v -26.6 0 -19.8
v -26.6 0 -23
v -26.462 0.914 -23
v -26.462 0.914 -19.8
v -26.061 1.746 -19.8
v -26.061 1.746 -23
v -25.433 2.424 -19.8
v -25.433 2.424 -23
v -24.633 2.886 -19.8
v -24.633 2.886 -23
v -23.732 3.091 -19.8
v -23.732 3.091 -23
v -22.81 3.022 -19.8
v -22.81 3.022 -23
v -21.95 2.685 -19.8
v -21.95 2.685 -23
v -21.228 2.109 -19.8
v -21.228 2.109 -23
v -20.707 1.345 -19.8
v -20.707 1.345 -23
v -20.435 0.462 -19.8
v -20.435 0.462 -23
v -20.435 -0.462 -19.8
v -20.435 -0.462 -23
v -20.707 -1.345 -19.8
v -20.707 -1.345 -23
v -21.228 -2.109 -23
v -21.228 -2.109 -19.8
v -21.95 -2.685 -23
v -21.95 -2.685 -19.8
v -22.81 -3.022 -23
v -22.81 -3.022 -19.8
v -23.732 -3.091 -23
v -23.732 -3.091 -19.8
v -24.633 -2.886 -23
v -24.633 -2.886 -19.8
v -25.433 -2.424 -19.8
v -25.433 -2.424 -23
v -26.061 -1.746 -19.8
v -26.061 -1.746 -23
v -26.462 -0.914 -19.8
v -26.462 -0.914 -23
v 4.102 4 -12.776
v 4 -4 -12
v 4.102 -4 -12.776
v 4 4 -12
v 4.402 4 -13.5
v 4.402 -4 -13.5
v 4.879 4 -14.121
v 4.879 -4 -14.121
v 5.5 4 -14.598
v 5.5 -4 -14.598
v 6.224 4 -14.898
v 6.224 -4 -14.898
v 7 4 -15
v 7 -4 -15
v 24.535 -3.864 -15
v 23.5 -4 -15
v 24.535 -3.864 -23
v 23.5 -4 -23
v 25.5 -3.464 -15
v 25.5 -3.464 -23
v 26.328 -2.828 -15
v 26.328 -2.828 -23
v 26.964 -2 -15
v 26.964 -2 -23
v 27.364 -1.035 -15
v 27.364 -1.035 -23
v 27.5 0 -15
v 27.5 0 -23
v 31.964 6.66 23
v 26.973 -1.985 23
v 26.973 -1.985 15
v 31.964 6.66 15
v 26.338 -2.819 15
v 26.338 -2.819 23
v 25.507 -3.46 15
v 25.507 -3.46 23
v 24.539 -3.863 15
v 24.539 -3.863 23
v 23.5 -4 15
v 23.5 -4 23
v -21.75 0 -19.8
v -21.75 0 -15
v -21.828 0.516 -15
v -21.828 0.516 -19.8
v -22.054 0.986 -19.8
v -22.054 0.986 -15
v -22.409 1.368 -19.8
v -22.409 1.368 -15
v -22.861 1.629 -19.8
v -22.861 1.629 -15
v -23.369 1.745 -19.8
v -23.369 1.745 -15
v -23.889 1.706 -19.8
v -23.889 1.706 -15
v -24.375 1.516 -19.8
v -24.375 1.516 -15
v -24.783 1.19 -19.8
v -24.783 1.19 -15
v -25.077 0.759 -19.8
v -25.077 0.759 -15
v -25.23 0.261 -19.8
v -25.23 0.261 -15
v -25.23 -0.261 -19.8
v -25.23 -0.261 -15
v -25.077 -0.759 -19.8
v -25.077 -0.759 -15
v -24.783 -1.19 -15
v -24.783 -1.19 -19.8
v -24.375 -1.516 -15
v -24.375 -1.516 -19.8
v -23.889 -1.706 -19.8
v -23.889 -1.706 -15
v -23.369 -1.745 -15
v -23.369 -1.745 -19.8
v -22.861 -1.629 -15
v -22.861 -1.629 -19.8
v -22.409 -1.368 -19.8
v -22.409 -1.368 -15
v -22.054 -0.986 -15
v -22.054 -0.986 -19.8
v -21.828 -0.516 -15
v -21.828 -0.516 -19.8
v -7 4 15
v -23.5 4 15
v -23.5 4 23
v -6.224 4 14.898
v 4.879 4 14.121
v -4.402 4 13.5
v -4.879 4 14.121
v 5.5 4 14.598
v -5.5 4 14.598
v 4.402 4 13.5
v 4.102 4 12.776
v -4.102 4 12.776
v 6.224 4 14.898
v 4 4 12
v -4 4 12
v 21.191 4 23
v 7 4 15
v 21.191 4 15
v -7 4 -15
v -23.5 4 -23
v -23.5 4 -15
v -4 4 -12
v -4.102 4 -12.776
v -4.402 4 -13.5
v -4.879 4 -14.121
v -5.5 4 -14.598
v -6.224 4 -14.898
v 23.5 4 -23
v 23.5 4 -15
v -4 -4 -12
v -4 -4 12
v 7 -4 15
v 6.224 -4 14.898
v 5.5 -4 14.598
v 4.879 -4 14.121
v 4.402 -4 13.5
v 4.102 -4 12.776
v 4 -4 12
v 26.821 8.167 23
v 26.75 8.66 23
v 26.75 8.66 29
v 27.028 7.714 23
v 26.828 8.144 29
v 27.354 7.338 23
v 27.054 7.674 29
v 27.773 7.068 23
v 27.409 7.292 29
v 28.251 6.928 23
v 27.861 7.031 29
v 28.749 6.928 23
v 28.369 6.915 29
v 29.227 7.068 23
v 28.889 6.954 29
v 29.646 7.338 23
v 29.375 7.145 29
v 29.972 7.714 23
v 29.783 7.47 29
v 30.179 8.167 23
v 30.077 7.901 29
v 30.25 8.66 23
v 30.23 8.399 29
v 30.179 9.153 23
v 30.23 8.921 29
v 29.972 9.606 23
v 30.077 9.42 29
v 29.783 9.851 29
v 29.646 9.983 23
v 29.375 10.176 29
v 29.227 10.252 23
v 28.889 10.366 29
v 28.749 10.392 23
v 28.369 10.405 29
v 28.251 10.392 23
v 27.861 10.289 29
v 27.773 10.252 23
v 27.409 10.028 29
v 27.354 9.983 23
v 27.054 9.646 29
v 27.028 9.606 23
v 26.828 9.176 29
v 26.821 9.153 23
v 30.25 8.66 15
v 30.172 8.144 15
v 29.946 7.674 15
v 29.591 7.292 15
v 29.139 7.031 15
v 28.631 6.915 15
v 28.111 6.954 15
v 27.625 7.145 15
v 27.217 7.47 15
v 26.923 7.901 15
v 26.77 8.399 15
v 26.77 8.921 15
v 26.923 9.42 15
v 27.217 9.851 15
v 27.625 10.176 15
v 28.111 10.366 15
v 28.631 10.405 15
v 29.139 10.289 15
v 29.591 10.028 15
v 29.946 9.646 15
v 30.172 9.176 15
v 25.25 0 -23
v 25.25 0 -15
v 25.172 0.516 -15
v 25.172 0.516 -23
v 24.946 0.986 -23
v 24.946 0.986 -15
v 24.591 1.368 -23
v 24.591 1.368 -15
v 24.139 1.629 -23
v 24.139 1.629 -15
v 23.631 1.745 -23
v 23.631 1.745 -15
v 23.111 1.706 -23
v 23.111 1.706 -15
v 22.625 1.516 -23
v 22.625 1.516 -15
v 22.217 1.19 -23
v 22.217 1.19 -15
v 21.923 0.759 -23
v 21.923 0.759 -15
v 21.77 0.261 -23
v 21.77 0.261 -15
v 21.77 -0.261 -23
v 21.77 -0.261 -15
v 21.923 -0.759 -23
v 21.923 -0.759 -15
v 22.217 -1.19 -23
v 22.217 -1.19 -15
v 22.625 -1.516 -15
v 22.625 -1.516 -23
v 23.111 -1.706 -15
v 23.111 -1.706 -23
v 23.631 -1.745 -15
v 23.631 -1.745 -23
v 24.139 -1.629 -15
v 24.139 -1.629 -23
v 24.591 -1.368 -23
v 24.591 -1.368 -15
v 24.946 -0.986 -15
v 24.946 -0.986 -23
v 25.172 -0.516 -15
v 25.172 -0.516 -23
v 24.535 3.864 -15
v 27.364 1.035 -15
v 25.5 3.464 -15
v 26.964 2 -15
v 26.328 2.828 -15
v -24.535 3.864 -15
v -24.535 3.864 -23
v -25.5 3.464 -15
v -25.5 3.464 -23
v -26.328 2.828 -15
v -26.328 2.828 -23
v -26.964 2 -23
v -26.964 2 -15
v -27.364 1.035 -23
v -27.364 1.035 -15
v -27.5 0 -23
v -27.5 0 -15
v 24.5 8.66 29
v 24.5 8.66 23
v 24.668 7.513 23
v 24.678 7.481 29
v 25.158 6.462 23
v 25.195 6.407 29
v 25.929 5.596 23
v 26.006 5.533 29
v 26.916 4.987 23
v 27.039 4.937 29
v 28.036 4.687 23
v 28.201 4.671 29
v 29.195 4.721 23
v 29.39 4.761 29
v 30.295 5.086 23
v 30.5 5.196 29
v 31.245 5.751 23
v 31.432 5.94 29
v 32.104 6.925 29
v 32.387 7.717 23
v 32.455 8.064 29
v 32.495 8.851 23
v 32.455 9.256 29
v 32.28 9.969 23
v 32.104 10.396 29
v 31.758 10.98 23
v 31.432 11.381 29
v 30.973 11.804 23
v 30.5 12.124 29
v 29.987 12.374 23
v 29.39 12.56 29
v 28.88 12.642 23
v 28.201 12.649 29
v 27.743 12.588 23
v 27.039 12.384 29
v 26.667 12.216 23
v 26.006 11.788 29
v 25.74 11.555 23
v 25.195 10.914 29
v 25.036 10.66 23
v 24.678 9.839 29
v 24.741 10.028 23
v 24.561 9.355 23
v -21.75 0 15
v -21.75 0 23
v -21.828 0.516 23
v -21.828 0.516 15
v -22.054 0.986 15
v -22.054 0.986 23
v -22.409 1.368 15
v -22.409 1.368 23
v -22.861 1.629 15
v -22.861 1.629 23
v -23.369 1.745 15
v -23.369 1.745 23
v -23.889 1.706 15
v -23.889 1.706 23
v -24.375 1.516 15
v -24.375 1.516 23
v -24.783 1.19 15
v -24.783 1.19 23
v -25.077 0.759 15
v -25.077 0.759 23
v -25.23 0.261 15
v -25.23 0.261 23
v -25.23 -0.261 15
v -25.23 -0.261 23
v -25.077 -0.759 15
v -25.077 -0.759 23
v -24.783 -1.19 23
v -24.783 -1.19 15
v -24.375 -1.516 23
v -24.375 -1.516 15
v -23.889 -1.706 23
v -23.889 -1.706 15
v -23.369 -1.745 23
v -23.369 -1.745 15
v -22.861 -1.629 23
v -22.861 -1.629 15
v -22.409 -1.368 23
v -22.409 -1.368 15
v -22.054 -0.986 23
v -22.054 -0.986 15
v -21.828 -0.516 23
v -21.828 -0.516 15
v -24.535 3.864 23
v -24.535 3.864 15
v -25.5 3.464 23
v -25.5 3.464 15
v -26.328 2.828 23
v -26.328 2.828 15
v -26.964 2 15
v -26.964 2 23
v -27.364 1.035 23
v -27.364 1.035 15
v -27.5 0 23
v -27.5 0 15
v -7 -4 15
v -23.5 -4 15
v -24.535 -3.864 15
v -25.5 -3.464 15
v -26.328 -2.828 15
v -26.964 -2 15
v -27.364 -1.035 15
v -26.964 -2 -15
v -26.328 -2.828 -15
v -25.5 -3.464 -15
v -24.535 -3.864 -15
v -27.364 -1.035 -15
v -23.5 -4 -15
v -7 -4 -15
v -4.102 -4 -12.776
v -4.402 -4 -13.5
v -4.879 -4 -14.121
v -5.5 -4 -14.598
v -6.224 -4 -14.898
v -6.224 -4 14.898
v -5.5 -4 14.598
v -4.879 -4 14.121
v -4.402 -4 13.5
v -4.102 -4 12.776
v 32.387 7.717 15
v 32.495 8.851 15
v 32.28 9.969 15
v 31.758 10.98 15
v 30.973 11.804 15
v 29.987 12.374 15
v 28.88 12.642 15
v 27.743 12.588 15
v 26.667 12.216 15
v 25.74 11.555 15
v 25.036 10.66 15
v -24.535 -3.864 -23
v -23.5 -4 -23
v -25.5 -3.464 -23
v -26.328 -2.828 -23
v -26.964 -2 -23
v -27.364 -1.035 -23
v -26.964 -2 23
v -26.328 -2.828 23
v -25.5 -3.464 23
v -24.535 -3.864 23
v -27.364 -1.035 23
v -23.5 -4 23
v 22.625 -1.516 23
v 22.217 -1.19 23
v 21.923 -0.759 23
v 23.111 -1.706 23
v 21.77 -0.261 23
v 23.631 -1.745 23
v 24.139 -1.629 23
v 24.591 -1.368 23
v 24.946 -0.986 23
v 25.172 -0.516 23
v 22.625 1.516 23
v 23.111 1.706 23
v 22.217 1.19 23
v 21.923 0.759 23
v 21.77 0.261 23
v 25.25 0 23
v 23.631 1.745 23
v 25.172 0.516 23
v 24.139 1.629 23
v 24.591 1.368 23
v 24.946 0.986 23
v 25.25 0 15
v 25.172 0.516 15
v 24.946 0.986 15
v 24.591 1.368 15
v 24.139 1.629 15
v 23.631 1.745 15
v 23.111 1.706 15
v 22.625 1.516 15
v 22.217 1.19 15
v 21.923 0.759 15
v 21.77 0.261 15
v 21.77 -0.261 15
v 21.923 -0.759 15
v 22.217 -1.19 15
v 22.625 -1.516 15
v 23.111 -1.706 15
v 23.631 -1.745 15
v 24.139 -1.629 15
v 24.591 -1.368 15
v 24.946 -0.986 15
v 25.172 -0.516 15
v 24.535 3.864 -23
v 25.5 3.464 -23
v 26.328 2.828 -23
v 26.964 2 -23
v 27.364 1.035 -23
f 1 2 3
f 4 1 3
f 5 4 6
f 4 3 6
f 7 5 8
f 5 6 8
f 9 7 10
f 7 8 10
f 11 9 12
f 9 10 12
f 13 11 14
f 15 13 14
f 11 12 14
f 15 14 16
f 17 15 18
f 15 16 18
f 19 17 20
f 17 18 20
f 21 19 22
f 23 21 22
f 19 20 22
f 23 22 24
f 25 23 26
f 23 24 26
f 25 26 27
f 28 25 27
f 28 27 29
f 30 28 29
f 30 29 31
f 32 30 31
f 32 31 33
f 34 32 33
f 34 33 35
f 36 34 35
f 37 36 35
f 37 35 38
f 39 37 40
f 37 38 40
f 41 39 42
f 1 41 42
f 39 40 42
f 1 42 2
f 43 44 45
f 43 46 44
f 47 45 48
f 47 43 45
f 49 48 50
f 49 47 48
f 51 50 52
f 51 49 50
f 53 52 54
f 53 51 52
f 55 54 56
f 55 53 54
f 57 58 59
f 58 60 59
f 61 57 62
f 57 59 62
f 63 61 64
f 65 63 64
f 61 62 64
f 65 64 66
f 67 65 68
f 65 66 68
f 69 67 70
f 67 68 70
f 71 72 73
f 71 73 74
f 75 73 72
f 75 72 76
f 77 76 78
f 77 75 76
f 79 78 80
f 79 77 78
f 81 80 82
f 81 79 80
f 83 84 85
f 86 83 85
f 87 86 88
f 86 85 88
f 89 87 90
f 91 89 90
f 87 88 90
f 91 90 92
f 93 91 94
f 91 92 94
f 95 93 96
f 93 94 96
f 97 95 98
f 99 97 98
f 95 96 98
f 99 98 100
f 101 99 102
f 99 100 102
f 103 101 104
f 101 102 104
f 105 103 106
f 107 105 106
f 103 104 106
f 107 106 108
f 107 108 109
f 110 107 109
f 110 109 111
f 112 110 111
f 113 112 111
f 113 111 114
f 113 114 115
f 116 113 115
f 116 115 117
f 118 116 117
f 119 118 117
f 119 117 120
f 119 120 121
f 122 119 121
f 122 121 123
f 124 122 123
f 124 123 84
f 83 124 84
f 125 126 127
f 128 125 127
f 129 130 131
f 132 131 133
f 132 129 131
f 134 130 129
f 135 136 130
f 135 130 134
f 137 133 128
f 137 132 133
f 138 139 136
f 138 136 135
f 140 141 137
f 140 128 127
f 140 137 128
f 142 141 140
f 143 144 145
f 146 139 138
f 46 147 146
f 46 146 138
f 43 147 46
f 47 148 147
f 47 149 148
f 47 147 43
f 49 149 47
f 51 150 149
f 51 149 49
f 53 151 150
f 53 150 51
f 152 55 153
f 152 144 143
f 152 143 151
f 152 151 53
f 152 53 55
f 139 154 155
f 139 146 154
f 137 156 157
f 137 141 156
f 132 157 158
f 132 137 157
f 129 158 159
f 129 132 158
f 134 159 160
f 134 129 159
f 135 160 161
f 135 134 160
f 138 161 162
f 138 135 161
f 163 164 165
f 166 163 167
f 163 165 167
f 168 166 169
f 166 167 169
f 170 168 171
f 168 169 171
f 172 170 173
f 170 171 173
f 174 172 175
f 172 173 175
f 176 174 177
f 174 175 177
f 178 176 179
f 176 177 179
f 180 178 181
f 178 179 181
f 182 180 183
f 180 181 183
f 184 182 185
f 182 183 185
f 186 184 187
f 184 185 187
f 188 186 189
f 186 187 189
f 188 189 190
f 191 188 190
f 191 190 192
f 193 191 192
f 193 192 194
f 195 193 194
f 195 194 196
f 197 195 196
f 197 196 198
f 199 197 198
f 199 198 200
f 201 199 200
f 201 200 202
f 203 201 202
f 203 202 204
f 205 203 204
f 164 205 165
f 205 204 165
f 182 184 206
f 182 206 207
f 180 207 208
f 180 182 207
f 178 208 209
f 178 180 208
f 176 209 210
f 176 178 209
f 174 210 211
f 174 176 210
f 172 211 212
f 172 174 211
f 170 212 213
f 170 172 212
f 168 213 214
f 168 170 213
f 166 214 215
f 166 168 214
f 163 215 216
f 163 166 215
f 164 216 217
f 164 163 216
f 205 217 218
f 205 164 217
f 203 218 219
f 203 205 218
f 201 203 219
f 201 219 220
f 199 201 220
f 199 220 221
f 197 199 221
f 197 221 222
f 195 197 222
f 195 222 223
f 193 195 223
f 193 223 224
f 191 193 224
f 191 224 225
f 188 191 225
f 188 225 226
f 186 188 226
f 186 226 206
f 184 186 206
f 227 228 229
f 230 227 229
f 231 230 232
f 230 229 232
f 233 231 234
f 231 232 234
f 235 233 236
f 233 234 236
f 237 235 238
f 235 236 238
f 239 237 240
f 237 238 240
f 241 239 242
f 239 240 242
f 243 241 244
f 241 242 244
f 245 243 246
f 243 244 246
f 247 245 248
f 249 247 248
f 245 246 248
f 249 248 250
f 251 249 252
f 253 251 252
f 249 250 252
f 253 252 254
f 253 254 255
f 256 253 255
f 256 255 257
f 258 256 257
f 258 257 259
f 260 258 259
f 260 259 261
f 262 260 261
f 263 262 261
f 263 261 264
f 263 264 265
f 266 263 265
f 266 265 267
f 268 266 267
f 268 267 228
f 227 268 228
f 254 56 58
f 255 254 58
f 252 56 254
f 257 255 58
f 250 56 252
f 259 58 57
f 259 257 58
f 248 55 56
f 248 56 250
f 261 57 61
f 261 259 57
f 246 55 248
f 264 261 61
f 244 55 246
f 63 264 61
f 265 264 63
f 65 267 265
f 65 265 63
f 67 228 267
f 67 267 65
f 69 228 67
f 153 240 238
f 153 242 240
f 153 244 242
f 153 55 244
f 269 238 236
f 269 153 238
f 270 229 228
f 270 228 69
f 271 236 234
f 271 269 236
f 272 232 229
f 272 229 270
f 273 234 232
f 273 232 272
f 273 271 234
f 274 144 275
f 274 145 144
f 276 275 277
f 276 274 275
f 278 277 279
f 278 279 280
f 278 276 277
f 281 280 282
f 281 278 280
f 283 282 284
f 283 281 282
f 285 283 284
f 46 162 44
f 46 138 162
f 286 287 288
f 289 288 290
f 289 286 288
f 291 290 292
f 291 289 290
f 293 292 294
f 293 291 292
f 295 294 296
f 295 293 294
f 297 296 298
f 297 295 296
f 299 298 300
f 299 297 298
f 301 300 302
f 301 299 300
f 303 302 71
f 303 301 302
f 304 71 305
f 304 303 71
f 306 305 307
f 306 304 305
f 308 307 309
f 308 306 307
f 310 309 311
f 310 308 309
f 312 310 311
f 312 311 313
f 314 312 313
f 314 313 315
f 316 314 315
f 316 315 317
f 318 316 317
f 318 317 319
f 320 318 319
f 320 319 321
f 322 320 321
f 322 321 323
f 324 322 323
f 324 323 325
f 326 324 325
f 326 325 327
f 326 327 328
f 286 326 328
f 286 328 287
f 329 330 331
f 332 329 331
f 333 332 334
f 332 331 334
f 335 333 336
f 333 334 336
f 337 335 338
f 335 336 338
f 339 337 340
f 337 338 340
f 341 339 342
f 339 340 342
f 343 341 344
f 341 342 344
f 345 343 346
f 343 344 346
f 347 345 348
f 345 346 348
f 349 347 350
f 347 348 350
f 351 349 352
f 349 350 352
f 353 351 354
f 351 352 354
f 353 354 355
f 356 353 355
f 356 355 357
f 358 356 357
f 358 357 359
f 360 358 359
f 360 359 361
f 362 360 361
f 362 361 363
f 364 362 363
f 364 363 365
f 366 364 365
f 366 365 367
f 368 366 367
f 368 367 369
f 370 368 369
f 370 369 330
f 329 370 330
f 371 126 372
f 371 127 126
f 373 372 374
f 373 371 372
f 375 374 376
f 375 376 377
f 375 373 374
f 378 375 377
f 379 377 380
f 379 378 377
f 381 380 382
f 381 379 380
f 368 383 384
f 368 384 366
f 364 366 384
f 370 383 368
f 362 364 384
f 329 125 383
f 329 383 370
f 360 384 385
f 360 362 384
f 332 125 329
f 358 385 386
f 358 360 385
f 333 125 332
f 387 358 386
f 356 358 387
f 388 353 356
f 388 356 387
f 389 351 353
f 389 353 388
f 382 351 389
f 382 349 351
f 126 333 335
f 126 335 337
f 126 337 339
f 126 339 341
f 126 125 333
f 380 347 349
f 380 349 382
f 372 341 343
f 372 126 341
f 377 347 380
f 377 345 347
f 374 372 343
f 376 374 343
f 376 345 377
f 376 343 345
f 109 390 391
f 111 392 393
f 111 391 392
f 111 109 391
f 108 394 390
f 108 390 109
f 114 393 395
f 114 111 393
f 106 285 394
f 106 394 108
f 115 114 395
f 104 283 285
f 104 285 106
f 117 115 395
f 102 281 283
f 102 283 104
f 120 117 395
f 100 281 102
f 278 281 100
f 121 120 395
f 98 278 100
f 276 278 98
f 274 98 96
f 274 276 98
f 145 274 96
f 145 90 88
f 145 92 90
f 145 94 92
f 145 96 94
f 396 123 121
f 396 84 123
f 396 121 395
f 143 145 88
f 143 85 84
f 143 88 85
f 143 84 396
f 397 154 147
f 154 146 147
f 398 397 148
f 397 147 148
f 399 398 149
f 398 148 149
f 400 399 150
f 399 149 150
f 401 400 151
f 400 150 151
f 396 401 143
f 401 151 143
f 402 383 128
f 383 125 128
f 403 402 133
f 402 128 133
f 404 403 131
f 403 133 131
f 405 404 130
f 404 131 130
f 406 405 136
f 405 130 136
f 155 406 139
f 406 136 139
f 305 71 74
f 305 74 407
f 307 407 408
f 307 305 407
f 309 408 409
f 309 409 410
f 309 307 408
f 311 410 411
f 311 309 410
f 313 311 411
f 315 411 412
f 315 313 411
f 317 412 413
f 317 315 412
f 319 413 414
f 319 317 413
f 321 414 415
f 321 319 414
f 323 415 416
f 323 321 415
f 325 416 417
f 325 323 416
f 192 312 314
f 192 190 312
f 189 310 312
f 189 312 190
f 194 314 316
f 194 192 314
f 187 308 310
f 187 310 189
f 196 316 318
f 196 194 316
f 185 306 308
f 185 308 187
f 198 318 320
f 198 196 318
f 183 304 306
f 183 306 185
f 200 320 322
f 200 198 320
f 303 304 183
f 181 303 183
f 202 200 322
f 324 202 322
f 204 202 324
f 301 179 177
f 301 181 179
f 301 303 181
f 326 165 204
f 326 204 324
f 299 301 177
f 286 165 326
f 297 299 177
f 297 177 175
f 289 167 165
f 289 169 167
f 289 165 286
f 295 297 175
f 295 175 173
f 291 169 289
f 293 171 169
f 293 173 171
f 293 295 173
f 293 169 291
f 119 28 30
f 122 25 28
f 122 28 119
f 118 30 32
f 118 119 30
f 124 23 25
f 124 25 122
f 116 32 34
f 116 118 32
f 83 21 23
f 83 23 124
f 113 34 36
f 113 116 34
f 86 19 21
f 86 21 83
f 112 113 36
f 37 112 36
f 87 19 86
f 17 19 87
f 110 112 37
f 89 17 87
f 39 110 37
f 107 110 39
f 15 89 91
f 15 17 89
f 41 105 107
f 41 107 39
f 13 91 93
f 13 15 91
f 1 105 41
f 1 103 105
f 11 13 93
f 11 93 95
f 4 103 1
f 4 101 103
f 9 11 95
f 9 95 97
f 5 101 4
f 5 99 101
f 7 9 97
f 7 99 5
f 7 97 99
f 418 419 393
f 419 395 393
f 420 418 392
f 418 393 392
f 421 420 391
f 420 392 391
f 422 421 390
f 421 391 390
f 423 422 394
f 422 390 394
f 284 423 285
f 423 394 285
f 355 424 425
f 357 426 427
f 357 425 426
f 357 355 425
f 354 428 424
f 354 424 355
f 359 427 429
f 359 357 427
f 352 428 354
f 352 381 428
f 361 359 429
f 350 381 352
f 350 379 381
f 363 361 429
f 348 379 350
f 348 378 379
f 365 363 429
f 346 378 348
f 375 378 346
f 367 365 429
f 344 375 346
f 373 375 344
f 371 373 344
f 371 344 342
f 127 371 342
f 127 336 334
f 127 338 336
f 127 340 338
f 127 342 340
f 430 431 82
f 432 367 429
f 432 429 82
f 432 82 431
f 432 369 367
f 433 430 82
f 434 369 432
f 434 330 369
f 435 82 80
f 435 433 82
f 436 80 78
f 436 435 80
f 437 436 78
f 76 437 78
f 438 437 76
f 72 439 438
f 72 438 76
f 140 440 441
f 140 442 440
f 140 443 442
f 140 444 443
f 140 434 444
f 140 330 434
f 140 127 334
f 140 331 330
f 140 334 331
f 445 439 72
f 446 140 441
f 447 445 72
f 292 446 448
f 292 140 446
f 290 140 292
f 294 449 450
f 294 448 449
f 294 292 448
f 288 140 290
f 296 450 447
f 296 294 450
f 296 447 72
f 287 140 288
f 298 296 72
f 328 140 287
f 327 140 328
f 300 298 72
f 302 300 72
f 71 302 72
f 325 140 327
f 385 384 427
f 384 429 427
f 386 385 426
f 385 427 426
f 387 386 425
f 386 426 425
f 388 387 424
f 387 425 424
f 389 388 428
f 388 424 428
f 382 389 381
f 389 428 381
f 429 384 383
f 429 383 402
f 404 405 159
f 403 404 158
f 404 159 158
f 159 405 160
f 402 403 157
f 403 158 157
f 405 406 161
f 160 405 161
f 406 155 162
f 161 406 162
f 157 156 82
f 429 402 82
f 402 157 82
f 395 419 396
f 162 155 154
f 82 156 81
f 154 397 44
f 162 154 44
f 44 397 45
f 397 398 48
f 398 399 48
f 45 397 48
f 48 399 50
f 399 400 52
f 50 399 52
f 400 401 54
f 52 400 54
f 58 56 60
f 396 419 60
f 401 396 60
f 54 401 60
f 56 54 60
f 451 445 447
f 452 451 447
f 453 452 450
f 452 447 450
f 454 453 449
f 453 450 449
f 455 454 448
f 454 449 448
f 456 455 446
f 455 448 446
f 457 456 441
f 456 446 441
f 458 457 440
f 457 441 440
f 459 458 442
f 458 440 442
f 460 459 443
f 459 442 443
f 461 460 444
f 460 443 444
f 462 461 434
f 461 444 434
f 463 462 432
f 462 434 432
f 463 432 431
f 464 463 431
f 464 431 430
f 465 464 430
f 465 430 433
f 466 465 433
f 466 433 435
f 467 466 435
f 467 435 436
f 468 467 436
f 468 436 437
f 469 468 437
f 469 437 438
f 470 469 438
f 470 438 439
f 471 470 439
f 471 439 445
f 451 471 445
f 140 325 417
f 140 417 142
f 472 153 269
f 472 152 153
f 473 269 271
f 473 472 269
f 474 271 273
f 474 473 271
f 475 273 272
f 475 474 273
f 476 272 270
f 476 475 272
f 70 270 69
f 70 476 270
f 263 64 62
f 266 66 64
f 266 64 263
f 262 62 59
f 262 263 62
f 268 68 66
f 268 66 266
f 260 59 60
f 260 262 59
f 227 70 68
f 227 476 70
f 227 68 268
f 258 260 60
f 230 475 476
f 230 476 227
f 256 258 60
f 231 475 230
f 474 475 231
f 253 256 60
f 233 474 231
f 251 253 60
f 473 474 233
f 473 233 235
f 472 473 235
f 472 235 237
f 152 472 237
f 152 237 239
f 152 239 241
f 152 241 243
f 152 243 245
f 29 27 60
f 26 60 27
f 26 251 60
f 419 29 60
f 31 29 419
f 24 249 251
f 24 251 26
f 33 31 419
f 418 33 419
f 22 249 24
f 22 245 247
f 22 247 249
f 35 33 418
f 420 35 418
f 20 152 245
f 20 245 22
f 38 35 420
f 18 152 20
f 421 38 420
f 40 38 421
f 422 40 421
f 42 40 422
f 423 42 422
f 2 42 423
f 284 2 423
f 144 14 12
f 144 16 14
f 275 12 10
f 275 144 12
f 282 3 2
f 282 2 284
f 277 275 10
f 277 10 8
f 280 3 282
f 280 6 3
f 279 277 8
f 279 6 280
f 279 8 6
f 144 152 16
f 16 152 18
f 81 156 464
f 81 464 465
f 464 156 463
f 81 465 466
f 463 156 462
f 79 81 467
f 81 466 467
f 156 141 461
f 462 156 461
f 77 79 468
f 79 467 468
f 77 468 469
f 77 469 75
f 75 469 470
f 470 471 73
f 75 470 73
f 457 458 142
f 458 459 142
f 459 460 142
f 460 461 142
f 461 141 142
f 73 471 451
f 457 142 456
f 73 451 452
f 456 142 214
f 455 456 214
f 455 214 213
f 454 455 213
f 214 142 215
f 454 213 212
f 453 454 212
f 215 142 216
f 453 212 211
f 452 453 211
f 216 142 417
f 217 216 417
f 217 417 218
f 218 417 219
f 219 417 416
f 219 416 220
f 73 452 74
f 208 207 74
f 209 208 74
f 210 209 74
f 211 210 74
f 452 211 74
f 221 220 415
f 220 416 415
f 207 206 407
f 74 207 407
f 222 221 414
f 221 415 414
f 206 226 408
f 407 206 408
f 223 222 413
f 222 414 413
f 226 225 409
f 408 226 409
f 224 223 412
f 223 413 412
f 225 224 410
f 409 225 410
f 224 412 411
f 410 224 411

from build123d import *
from build123d.topology import SkipClean

# Parameters (mm, degrees)
SALIENTE_EXTRUIR1_DEPTH = 4
CROQUIS3_R              = 1.75
CORTAR_EXTRUIR1_DEPTH   = 54.742441329
REDONDEO8_R             = 4
REDONDEO9_R             = 3
SALIENTE_EXTRUIR3_START = -46
CROQUIS5_R              = 1.75
SALIENTE_EXTRUIR3_DEPTH = 8
SALIENTE_EXTRUIR2_START = 52
CROQUIS4_R              = 4
CROQUIS4_R_2            = 1.75
SALIENTE_EXTRUIR2_DEPTH = 6
CROQUIS6_R              = 3.1
CORTAR_EXTRUIR2_DEPTH   = 3.2


with BuildPart() as part:
    # Croquis2 → Saliente-Extruir1 (new, symmetric)
    with BuildSketch(Plane(origin=(0, 0, 0), x_dir=(1, 0, 0), z_dir=(0, 1, 0))):
        Polygon((27.5, -23), (27.5, -15), (4, -15), (4, 15), (27.5, 15), (27.5, 23), (-27.5, 23), (-27.5, 15), (-4, 15), (-4, -15), (-27.5, -15), (-27.5, -23), align=None)
    extrude(amount=SALIENTE_EXTRUIR1_DEPTH, both=True)

    # Croquis3 → Cortar-Extruir1 (cut, through all)
    with BuildSketch(Plane.XY.offset(23)):
        with Locations((23.5, 0)):
            Circle(CROQUIS3_R)
        with Locations((-23.5, 0)):
            Circle(CROQUIS3_R)
    extrude(amount=-CORTAR_EXTRUIR1_DEPTH, mode=Mode.SUBTRACT)

    # Redondeo8
    redondeo8_edges = [part.edges().sort_by_distance(p)[0] for p in [
        (27.5, -4, -19),
        (27.5, 4, -19),
        (27.5, -4, 19),
        (27.5, 4, 19),
        (-27.5, -4, -19),
        (-27.5, 4, -19),
        (-27.5, -4, 19),
        (-27.5, 4, 19),
    ]]
    fillet(redondeo8_edges, radius=REDONDEO8_R - 0.0001)  # a hair under: the kernel refuses the full size

    # Redondeo9
    redondeo9_edges = [part.edges().sort_by_distance(p)[0] for p in [
        (4, 0, -15),
        (4, 0, 15),
        (-4, 0, 15),
        (-4, 0, -15),
    ]]
    fillet(redondeo9_edges, radius=REDONDEO9_R)

    # Croquis5 → Saliente-Extruir3 (add)
    with BuildSketch(Plane(origin=(0, 0, -23), x_dir=(-1, 0, 0), z_dir=(0, 0, -1)).offset(SALIENTE_EXTRUIR3_START)):
        with BuildLine():
            Line((-25.035898385, 10.660254038), (-20.035898385, 2))
            ThreePointArc((-20.035898385, 2), (-21.5, -3.464101615), (-26.964101615, -2))
            Line((-26.964101615, -2), (-31.964101615, 6.660254038))
            ThreePointArc((-31.964101615, 6.660254038), (-30.5, 12.124355653), (-25.035898385, 10.660254038))
        make_face()
        with Locations(Location((-23.5, 0, 0), (0, 0, 180))):
            Circle(CROQUIS5_R, mode=Mode.SUBTRACT)
        with Locations(Location((-28.5, 8.660254038, 0), (0, 0, 180))):
            Circle(CROQUIS5_R, mode=Mode.SUBTRACT)
    extrude(amount=SALIENTE_EXTRUIR3_DEPTH)

    # Croquis4 → Saliente-Extruir2 (add)
    with SkipClean():  # the faces are left unmerged after this step: merging them gives an invalid solid
        with BuildSketch(Plane.XY.offset(-23).offset(SALIENTE_EXTRUIR2_START)):
            with Locations(Location((28.5, 8.660254038, 0), (0, 0, 180))):
                Circle(CROQUIS4_R)
            with Locations(Location((28.5, 8.660254038, 0), (0, 0, 180))):
                Circle(CROQUIS4_R_2, mode=Mode.SUBTRACT)
        extrude(amount=-SALIENTE_EXTRUIR2_DEPTH)

    # Croquis6 → Cortar-Extruir2 (cut)
    with SkipClean():  # the faces are left unmerged after this step: merging them gives an invalid solid
        with BuildSketch(Plane(origin=(0, 0, -23), x_dir=(-1, 0, 0), z_dir=(0, 0, -1))):
            with Locations((23.5, 0)):
                Circle(CROQUIS6_R)
        extrude(amount=-CORTAR_EXTRUIR2_DEPTH, mode=Mode.SUBTRACT)


solid = part.part
